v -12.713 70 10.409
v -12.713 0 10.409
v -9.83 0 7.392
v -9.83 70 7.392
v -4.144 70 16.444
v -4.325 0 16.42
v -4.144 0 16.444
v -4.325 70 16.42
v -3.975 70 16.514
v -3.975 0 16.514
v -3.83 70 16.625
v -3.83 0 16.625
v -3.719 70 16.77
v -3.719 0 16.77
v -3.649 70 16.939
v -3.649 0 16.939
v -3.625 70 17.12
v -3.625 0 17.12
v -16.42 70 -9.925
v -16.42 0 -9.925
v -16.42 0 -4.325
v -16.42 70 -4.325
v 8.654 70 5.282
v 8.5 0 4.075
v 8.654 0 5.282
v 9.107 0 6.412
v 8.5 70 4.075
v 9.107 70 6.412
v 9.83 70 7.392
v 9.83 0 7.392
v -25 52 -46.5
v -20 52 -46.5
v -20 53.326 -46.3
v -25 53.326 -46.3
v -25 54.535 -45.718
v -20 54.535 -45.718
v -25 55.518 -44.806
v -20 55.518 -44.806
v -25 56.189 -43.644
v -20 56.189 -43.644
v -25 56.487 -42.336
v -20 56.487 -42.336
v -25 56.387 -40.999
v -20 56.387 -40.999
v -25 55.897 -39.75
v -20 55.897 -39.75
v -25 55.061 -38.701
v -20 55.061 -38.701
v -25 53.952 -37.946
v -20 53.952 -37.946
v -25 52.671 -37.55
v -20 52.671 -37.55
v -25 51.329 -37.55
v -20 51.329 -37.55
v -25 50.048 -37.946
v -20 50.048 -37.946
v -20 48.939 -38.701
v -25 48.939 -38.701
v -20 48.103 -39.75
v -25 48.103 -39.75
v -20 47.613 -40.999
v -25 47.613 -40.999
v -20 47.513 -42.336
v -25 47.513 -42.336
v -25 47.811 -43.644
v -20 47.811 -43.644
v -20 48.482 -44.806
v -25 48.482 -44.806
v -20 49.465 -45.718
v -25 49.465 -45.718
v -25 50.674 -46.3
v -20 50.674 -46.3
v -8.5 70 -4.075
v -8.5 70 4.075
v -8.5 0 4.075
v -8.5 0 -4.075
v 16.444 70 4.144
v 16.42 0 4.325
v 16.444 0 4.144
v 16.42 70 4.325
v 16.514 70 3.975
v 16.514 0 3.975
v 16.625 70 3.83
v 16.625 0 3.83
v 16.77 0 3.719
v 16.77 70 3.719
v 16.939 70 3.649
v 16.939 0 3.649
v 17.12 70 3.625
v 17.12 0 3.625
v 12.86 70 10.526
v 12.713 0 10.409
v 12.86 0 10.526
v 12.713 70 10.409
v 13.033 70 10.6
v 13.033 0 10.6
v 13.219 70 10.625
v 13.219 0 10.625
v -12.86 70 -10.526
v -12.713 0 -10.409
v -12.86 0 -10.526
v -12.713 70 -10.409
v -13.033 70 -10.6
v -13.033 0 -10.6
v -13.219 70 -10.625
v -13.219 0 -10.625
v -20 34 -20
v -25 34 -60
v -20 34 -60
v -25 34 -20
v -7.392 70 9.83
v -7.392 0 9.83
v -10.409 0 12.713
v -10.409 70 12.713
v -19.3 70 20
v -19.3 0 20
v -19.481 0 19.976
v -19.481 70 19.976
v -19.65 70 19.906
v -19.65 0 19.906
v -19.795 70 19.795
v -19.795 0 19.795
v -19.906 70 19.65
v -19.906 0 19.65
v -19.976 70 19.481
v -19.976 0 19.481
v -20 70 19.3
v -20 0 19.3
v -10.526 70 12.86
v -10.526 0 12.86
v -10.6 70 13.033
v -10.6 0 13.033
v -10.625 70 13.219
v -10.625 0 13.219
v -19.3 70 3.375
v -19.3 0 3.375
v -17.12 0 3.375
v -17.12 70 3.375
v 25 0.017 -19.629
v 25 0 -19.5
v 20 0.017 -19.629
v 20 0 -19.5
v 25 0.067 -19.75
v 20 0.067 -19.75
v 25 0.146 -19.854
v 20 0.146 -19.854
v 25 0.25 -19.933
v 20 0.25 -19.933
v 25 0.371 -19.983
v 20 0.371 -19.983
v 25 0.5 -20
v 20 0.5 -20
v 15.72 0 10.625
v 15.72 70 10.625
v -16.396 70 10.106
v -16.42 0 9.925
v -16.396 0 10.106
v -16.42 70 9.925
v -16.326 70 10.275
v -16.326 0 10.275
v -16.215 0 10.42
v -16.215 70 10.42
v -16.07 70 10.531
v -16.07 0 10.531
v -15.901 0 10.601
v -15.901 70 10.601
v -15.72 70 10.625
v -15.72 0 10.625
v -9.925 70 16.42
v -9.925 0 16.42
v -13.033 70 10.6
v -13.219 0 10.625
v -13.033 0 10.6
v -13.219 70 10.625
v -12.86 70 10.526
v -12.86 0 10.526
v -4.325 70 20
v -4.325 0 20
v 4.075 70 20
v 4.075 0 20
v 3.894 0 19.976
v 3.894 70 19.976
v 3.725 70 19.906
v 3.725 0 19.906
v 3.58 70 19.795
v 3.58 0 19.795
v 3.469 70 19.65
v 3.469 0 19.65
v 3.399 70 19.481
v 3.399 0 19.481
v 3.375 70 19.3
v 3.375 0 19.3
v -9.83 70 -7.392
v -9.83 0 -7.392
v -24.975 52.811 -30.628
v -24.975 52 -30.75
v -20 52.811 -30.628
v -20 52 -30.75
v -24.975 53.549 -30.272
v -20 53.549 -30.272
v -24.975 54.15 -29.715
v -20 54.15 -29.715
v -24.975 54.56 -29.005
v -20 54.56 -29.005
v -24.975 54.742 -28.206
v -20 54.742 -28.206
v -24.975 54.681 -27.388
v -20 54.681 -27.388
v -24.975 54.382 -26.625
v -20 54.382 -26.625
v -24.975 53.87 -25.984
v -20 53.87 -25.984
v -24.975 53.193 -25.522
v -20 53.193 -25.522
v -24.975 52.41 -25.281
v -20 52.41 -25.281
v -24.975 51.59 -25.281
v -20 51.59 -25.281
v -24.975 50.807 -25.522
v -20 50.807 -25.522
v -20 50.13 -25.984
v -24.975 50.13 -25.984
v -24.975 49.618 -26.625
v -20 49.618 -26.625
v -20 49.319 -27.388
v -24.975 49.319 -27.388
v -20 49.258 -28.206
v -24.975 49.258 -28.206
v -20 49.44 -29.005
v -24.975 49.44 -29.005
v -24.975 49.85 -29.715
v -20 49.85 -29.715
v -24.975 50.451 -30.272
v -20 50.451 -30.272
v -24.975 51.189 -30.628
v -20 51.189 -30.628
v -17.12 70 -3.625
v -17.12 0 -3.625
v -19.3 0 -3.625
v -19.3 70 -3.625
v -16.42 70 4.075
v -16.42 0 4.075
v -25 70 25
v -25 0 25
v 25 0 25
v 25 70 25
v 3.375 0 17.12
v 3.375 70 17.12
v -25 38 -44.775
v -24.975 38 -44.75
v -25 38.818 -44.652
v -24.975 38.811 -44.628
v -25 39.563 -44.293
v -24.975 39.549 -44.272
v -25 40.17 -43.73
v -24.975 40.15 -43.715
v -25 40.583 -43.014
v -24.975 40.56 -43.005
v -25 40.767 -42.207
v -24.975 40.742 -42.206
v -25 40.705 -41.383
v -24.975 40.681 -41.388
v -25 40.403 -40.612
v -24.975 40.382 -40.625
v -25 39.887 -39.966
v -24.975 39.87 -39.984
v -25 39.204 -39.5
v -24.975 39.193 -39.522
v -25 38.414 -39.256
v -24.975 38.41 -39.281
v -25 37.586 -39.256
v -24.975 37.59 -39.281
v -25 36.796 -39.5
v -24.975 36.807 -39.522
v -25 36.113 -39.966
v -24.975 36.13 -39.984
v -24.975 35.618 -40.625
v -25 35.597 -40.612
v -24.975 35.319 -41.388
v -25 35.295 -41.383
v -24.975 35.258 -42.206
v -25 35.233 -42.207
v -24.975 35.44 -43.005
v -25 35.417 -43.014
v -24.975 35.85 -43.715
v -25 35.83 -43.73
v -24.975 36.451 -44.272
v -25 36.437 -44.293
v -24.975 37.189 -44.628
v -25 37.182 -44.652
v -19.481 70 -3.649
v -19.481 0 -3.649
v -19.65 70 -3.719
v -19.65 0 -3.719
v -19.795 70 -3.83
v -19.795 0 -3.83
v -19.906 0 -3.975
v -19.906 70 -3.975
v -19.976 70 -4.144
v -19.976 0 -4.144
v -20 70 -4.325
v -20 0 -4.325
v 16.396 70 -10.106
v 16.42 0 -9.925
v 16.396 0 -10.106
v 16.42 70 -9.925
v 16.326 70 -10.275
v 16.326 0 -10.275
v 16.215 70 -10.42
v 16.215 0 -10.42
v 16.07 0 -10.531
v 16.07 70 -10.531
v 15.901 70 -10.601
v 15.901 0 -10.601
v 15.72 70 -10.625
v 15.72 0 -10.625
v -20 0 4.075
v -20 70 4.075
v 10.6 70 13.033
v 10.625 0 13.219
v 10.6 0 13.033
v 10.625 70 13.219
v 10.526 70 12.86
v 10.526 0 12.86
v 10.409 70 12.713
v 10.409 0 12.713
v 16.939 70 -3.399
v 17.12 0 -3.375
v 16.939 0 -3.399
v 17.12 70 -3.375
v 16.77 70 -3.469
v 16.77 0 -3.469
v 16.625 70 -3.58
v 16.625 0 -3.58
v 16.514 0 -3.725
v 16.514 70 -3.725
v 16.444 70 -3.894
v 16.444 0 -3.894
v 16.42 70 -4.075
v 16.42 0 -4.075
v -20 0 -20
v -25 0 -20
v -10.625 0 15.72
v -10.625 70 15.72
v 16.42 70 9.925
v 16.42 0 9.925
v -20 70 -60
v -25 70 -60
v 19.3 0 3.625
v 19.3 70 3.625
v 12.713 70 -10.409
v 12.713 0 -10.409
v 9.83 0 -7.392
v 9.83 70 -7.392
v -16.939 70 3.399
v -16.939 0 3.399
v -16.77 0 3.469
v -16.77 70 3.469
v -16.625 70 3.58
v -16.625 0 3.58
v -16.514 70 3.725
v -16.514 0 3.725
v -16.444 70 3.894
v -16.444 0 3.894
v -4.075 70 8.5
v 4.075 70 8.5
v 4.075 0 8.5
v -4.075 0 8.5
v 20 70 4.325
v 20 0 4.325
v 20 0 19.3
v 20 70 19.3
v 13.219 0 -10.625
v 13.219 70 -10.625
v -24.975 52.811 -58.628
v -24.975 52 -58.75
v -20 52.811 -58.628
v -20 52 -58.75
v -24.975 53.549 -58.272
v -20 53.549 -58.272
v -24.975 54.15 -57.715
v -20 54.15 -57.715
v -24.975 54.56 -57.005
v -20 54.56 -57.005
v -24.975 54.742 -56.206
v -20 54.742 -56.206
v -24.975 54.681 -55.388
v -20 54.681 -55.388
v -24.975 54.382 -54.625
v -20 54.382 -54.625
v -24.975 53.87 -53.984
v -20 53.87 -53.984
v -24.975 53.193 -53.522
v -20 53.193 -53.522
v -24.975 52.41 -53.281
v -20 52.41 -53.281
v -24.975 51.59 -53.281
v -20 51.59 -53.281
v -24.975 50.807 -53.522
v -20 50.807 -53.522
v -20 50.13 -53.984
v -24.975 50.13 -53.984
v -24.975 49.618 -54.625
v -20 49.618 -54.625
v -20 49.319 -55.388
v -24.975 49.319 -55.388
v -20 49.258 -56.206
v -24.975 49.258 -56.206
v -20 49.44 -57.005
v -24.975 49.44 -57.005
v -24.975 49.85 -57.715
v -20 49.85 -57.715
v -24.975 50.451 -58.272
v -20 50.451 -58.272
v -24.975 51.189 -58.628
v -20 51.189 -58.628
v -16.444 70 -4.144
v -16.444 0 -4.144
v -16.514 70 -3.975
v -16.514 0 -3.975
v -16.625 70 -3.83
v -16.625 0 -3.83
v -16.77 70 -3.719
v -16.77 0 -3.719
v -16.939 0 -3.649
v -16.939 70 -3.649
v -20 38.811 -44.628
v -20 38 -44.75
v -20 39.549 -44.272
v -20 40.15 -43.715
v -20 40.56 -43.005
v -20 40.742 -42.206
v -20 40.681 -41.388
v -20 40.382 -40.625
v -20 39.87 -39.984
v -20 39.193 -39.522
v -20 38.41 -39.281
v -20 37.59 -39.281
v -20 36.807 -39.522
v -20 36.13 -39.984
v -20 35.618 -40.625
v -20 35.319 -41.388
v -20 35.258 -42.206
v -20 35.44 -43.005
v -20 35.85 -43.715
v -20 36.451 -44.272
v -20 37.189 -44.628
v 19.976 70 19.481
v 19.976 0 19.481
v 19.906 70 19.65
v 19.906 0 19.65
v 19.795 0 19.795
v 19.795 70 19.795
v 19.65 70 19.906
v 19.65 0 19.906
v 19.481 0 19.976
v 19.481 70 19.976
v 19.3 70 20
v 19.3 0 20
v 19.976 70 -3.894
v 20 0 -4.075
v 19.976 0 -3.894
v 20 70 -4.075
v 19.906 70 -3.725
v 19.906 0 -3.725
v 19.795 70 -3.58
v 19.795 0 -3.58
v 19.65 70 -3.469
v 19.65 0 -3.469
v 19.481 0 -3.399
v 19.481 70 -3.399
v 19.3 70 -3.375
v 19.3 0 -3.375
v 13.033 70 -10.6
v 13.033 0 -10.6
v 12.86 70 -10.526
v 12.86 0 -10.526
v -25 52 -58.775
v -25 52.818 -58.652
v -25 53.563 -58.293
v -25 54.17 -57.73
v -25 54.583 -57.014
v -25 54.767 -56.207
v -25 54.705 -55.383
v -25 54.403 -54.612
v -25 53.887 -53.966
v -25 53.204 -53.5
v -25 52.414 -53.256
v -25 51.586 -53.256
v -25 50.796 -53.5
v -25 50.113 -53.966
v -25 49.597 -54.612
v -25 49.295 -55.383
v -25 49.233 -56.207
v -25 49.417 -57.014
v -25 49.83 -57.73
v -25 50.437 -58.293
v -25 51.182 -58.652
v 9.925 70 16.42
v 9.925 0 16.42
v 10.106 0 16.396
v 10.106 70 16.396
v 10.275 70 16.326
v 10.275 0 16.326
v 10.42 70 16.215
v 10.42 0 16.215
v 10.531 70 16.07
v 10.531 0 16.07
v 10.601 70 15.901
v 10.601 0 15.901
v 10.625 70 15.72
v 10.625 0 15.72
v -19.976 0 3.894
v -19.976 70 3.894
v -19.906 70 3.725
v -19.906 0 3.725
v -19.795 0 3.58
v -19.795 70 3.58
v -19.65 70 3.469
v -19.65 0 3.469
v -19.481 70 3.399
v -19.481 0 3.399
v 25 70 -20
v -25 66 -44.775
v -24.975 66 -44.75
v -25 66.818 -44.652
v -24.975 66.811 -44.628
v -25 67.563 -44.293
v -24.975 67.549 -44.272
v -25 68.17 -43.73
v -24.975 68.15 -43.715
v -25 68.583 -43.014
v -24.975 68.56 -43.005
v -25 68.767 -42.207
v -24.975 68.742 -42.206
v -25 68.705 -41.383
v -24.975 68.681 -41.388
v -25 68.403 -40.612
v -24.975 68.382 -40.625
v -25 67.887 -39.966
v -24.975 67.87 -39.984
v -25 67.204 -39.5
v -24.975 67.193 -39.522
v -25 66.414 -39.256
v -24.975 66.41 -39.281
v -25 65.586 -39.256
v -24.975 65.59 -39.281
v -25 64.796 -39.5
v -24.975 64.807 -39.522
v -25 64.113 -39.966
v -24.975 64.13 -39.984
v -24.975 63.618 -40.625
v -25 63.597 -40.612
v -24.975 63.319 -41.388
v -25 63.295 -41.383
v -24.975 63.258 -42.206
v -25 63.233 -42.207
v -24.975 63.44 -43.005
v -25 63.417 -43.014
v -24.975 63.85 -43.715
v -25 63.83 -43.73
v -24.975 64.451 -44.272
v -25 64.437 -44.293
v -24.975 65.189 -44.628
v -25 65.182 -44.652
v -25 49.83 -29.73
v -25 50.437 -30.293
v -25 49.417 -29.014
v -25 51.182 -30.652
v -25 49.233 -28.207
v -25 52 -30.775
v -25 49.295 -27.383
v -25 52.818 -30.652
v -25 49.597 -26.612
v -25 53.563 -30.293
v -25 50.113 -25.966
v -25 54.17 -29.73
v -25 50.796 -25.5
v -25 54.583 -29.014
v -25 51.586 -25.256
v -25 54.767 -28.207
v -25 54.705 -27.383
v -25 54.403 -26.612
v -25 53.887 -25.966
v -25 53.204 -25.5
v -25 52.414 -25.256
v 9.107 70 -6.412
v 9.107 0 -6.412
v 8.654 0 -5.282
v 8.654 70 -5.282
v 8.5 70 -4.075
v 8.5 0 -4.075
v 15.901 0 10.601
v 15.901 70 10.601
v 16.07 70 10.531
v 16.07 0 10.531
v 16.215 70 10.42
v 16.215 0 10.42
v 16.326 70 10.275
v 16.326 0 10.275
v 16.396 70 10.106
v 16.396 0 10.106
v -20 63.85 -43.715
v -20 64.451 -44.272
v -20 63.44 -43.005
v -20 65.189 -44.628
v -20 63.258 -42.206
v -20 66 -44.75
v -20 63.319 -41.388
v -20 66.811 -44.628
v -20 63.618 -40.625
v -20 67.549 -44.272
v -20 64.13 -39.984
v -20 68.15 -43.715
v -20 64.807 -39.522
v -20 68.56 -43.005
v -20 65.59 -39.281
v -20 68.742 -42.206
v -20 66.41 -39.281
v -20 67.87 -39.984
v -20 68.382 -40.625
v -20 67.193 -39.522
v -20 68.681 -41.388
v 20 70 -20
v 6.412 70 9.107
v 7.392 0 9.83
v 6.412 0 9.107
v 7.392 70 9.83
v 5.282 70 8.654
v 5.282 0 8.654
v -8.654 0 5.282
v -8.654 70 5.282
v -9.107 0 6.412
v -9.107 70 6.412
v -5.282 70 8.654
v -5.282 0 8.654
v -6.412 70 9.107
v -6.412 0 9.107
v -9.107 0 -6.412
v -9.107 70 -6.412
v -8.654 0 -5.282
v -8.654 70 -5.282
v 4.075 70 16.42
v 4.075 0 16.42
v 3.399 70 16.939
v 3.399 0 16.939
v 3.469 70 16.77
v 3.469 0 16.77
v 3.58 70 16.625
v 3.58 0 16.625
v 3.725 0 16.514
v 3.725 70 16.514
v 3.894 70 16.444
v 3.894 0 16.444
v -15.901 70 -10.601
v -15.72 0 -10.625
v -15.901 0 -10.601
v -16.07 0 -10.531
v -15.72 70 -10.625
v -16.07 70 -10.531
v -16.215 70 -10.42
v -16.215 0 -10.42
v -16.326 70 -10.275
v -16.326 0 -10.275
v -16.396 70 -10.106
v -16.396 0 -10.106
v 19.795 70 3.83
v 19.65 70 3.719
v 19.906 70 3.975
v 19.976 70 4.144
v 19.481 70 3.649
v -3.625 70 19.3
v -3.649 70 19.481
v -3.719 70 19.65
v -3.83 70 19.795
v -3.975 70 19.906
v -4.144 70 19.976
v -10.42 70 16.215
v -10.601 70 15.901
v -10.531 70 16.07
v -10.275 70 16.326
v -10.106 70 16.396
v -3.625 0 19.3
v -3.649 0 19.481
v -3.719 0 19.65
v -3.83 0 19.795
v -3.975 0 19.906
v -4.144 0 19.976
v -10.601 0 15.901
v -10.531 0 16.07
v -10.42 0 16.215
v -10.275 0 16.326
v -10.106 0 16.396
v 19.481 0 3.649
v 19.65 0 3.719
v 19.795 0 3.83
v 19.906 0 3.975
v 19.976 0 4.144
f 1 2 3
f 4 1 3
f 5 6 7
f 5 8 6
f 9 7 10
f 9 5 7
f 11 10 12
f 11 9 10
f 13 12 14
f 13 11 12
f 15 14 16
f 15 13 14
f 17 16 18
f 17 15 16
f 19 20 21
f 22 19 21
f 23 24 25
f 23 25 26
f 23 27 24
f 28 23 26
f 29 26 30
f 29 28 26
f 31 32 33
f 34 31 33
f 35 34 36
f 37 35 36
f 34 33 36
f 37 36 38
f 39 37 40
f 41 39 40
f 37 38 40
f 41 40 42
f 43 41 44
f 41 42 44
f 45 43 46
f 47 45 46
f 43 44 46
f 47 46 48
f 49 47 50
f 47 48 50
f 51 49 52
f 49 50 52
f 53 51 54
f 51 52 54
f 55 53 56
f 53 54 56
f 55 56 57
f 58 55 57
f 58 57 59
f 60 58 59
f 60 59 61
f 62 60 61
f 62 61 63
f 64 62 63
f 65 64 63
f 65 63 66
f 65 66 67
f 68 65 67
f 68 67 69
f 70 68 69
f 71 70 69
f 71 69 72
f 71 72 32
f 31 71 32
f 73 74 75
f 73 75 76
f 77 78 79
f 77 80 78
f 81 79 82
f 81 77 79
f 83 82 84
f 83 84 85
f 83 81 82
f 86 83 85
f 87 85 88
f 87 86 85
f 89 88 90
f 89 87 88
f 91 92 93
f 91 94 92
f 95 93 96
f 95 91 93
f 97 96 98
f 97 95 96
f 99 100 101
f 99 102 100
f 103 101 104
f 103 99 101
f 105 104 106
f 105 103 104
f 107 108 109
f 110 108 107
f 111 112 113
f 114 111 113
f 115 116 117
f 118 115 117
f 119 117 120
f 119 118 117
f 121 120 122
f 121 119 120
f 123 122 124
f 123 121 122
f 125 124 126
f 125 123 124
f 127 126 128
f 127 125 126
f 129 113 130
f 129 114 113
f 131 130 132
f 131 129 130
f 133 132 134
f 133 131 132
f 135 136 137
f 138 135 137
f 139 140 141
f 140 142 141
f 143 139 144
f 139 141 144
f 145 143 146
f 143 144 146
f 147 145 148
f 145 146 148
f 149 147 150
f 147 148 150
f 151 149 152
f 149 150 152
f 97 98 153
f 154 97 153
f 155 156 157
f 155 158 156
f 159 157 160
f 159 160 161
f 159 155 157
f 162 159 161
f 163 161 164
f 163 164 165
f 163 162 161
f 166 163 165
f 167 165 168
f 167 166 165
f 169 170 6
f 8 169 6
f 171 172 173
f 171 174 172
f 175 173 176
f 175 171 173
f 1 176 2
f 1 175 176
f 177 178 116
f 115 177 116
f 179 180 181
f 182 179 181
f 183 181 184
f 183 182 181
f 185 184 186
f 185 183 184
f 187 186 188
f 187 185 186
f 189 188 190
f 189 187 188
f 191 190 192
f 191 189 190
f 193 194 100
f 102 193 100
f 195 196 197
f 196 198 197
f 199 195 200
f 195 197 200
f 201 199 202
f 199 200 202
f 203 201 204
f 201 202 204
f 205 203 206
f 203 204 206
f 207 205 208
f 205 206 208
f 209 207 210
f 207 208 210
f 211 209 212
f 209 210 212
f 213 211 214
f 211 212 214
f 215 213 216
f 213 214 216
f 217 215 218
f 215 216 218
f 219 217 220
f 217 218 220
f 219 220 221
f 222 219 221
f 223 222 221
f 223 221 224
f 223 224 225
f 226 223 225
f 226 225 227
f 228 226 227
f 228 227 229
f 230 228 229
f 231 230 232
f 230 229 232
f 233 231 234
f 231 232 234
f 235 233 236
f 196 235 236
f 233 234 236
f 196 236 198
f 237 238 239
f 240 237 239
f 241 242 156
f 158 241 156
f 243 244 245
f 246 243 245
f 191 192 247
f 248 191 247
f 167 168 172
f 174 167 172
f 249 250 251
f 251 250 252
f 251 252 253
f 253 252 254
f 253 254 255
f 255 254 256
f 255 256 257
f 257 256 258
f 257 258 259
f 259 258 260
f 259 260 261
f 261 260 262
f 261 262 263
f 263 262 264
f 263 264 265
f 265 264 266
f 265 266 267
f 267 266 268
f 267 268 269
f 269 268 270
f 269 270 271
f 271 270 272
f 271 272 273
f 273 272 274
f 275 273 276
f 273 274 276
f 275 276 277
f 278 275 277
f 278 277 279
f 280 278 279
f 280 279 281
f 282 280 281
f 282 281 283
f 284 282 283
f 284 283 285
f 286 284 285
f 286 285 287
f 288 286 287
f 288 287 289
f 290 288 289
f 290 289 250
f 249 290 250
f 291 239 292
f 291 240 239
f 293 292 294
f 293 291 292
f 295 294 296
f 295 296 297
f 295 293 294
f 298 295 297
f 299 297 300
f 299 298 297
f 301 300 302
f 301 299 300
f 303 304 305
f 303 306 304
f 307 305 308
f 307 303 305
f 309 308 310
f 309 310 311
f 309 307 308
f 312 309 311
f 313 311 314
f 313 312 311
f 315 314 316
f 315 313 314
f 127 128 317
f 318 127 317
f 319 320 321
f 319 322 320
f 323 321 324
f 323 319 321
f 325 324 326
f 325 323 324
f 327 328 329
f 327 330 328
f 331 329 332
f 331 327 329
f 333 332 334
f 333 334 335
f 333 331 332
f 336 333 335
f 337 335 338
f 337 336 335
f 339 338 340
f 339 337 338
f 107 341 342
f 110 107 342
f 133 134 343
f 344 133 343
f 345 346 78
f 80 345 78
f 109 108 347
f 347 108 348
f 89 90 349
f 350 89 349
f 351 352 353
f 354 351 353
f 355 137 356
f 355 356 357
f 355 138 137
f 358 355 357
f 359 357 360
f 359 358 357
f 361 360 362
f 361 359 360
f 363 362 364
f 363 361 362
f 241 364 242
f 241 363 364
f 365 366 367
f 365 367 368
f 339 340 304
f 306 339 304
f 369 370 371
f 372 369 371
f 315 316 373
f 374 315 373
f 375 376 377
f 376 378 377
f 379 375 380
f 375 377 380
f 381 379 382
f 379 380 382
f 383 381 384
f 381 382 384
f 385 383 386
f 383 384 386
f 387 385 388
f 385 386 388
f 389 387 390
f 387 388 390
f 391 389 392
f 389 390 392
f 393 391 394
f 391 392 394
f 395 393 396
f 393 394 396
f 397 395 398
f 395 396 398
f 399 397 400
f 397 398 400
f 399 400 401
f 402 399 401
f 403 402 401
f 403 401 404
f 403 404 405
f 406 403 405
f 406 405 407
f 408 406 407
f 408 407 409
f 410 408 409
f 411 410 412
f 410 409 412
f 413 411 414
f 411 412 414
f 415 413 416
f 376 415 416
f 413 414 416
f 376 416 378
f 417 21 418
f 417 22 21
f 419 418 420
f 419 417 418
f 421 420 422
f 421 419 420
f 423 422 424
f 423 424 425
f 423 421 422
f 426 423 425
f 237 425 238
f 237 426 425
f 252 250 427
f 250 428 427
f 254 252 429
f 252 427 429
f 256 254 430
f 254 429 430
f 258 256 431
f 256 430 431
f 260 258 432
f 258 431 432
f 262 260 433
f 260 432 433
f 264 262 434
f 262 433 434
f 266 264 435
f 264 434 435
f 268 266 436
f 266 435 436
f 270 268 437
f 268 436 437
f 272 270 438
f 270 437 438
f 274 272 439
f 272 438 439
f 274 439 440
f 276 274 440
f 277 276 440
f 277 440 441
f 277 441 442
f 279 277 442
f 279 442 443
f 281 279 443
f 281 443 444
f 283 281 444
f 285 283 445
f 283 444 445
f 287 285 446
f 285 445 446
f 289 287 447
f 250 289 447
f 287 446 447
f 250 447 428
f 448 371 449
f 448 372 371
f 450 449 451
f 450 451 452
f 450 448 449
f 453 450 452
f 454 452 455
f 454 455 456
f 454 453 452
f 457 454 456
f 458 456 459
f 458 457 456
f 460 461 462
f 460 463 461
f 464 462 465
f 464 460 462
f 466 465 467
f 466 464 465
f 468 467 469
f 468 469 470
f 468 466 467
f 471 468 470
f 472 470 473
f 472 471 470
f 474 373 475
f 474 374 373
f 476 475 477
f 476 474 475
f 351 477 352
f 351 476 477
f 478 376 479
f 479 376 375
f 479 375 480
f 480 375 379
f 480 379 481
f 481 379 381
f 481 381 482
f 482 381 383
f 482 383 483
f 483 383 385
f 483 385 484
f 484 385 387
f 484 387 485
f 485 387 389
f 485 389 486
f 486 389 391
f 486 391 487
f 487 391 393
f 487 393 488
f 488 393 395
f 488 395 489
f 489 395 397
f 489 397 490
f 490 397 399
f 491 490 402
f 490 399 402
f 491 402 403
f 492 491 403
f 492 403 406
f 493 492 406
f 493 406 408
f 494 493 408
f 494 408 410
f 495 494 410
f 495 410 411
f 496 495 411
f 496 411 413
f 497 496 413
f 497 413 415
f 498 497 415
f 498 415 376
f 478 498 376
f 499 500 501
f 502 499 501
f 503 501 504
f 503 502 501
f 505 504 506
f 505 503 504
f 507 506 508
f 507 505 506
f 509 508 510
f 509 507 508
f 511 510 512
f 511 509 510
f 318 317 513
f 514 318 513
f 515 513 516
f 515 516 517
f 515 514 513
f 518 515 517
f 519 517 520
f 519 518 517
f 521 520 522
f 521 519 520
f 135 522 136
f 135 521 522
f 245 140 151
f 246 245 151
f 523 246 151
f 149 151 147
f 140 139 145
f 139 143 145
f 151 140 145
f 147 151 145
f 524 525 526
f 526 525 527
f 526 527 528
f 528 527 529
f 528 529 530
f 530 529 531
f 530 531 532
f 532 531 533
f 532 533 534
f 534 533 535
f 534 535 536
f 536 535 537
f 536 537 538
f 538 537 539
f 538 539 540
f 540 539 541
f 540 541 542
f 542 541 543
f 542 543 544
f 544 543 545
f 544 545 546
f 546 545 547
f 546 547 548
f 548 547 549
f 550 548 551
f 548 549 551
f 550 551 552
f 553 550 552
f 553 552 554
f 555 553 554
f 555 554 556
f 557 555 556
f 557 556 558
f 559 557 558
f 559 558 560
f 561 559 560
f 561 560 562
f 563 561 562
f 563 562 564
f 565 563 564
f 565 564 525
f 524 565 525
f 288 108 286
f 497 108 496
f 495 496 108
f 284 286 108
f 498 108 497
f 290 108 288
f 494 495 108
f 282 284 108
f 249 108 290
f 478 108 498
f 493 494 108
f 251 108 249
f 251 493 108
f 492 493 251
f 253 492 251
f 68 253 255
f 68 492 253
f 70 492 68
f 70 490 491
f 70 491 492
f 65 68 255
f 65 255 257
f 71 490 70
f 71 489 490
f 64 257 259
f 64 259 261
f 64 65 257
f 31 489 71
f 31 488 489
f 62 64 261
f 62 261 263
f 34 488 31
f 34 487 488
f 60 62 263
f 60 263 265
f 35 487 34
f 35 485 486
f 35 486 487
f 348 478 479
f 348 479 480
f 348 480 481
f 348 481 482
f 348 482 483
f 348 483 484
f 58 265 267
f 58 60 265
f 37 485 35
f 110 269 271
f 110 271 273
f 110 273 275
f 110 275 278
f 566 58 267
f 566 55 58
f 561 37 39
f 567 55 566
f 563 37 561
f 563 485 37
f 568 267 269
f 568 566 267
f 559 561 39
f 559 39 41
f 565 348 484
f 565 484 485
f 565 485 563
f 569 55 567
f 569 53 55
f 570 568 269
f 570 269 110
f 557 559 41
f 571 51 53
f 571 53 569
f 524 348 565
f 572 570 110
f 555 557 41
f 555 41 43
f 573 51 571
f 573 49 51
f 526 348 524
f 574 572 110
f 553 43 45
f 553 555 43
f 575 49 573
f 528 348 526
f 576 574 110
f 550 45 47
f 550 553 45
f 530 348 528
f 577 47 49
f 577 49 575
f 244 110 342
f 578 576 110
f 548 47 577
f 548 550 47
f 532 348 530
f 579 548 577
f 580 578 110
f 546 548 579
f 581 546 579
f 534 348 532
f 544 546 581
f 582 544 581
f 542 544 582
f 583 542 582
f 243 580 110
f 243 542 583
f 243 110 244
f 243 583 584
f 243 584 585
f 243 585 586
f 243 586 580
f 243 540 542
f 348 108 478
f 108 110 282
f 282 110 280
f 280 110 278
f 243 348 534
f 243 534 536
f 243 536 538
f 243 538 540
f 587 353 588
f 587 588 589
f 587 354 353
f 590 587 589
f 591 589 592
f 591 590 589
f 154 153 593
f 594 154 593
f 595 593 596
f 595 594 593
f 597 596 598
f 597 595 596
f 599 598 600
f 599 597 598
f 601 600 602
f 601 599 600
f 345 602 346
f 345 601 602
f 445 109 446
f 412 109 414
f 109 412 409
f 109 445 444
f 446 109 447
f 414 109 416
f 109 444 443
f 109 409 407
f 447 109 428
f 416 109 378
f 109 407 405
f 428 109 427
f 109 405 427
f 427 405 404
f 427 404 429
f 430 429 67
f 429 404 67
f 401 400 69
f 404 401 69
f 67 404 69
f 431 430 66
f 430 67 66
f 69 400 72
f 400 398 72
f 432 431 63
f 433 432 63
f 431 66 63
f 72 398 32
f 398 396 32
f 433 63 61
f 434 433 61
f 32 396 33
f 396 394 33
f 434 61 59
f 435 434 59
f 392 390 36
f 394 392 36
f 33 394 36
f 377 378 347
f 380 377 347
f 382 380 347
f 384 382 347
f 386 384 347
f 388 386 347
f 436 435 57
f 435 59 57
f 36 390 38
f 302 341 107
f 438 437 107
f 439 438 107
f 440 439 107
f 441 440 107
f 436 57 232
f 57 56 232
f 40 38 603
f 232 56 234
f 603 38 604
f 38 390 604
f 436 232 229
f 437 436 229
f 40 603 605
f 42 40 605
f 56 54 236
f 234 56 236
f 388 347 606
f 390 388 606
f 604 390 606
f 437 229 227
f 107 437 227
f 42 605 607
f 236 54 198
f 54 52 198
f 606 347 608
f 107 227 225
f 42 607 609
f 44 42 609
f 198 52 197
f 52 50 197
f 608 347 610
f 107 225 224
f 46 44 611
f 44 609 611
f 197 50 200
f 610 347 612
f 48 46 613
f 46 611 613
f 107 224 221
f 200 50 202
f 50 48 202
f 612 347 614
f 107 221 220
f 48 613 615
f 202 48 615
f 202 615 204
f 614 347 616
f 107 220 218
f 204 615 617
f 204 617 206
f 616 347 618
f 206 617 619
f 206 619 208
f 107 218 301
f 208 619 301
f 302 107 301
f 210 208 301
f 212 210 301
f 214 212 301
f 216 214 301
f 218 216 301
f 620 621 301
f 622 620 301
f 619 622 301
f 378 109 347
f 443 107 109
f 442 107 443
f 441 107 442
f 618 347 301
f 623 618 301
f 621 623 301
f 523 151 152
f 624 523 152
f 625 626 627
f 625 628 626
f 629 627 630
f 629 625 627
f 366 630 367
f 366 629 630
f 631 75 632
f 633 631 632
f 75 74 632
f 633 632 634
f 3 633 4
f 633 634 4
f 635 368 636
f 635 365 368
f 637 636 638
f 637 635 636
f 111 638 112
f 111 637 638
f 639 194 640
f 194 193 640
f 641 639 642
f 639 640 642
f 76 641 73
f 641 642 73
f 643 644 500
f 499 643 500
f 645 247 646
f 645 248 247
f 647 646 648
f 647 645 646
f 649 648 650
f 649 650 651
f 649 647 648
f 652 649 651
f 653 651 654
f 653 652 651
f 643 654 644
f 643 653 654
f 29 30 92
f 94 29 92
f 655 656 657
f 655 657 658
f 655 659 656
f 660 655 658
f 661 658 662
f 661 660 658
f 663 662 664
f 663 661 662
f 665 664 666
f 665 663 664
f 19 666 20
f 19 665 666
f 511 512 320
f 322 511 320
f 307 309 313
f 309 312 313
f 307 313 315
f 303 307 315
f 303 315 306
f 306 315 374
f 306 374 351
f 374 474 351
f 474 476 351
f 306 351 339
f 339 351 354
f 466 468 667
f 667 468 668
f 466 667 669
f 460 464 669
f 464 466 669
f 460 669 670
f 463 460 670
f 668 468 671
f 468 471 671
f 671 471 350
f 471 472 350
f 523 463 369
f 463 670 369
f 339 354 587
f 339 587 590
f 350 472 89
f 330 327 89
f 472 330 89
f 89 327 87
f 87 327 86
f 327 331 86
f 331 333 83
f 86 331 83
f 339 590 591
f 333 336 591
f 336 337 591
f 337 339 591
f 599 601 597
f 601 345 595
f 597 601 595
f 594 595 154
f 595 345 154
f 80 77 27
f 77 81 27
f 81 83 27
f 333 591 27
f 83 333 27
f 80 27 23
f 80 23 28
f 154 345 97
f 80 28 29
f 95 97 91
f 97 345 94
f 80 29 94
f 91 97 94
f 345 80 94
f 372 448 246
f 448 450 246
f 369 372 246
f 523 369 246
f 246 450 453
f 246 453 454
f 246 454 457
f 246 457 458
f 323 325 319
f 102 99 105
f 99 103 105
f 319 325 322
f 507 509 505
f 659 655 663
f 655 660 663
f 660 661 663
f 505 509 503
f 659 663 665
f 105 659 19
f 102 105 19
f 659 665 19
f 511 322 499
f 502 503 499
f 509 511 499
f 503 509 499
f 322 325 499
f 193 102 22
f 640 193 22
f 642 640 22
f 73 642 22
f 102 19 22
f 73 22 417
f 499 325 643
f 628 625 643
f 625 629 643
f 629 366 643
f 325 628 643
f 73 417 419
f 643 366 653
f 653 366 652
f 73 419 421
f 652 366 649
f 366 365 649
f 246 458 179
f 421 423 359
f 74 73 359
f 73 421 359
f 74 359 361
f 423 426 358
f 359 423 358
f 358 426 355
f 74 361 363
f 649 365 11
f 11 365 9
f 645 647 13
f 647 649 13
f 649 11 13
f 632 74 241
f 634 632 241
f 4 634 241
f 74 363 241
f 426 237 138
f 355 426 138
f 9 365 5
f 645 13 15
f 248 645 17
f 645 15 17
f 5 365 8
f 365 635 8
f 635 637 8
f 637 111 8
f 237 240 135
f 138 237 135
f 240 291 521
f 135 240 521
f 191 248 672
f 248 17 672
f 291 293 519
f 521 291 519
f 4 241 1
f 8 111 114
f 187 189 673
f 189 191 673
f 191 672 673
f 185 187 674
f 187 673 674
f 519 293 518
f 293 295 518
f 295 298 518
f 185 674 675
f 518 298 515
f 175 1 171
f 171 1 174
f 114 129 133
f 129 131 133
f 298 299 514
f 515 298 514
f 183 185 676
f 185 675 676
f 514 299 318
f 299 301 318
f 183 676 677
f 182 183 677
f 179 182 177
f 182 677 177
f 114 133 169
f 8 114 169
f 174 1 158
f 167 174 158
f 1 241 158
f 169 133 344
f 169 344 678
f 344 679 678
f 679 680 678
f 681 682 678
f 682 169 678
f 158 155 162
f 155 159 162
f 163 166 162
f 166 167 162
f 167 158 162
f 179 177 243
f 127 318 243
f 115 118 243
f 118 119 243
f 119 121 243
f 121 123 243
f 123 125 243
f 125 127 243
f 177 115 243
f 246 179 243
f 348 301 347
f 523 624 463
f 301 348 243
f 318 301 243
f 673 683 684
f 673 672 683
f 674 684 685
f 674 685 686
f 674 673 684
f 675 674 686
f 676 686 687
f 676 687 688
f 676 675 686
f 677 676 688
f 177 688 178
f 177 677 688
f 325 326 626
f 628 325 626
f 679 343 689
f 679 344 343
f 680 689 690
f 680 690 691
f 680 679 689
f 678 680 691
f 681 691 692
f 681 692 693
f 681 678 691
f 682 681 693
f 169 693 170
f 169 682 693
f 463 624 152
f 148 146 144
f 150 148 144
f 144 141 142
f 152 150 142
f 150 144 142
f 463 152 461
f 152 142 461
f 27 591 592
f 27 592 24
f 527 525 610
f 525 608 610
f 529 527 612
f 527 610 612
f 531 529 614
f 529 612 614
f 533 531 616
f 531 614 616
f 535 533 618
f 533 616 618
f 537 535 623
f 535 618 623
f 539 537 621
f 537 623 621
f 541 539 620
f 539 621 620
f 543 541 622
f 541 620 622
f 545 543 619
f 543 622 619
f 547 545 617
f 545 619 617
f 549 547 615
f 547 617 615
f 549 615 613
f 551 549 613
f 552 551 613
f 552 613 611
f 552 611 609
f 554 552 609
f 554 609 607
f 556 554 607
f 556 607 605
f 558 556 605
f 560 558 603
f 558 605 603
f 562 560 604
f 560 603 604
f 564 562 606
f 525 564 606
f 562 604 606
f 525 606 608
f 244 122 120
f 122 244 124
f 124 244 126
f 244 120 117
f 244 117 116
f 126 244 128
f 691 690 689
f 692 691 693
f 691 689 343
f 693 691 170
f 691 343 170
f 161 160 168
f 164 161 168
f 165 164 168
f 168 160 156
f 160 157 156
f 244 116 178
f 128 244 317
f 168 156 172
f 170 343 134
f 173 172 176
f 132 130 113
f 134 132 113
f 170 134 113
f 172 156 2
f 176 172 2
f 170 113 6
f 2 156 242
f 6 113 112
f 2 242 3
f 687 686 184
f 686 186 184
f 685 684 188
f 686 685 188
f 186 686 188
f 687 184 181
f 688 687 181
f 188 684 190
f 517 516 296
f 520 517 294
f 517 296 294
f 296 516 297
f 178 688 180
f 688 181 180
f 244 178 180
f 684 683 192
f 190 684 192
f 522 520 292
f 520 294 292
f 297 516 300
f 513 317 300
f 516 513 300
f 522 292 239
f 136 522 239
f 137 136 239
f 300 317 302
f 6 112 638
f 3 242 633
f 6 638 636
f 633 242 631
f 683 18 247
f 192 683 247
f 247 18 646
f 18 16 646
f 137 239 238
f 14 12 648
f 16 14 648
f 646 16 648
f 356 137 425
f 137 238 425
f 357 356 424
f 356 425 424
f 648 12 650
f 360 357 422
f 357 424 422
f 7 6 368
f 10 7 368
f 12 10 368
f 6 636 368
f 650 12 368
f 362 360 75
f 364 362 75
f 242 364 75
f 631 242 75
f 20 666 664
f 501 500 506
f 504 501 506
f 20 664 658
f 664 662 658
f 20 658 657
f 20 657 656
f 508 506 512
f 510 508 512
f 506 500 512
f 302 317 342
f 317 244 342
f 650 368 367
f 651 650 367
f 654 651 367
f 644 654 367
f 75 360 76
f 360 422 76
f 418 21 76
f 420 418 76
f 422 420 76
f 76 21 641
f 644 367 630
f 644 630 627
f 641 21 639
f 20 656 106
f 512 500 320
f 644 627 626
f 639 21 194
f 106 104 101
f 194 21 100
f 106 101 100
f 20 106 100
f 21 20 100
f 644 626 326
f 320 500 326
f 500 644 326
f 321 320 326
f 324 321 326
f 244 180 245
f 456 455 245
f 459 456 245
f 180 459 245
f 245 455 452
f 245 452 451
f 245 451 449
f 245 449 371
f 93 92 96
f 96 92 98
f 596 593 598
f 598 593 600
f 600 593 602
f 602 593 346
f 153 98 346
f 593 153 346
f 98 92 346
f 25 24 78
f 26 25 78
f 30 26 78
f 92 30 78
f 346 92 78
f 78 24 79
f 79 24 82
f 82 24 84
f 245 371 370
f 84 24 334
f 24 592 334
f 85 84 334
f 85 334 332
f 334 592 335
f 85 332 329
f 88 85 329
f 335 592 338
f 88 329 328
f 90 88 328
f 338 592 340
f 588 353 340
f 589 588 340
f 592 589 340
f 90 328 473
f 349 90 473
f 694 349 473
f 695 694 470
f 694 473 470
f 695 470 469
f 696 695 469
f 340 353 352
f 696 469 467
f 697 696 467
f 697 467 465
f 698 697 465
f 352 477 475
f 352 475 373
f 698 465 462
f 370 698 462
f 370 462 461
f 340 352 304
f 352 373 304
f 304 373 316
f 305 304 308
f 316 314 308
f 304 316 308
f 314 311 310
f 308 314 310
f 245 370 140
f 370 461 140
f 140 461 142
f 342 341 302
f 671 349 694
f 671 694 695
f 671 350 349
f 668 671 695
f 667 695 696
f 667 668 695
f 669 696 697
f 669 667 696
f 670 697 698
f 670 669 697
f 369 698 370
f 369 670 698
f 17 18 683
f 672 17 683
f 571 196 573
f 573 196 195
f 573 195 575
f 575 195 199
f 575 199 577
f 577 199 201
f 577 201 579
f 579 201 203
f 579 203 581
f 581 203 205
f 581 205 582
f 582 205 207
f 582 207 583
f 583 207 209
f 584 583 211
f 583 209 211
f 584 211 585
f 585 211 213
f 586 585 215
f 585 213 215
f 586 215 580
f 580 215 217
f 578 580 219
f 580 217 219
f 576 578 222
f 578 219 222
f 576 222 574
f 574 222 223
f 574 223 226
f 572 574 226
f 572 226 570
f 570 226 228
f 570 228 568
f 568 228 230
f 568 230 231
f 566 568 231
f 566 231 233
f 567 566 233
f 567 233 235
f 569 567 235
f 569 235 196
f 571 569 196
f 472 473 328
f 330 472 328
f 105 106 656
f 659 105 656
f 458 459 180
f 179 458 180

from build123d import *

# Parameters (mm, degrees)
BOSS_EXTRUDE1_DEPTH            = 70
FILLET4_R                      = 0.7
FILLET6_R                      = 4.8
FILLET12_R                     = 0.5
SKETCH2_W                      = 40
SKETCH2_H                      = 36
BOSS_EXTRUDE2_DEPTH            = 5
M5_CLEARANCE_HOLE1_D           = 5.5
M5_CLEARANCE_HOLE1_DEPTH       = 13
M5_CLEARANCE_HOLE1_CSINK_D     = 5.55
M5_CLEARANCE_HOLE1_CSINK_ANGLE = 90
M5_CLEARANCE_HOLE1_TIP         = 1.652366702
SKETCH7_R                      = 4.5
CUT_EXTRUDE1_DEPTH             = 46
CUT_EXTRUDE1_DEPTH_BACK        = 6


with BuildPart() as part:
    # Sketch1 → Boss-Extrude1 (new body)
    with BuildSketch(Plane(origin=(0, 0, 0), x_dir=(1, 0, 0), z_dir=(0, 1, 0))):
        Polygon((-25, -25), (25, -25), (25, 20), (20, 20), (20, 3.375), (16.42, 3.375), (16.42, 10.625), (12.92, 10.625), (8.5, 6), (8.5, -6), (12.92, -10.625), (16.42, -10.625), (16.42, -3.625), (20, -3.625), (20, -20), (3.375, -20), (3.375, -16.42), (10.625, -16.42), (10.625, -12.92), (6, -8.5), (-6, -8.5), (-10.625, -12.92), (-10.625, -16.42), (-3.625, -16.42), (-3.625, -20), (-20, -20), (-20, -3.375), (-16.42, -3.375), (-16.42, -10.625), (-12.92, -10.625), (-8.5, -6), (-8.5, 6), (-12.92, 10.625), (-16.42, 10.625), (-16.42, 3.625), (-20, 3.625), (-20, 20), (-25, 20), align=None)
    extrude(amount=BOSS_EXTRUDE1_DEPTH)

    # Fillet4
    fillet4_edges = [part.edges().sort_by_distance(p)[0] for p in [
        (-3.625, 35, 16.42),
        (-10.625, 35, 16.42),
        (-10.625, 35, 12.92),
        (10.625, 35, 12.92),
        (10.625, 35, 16.42),
        (3.375, 35, 16.42),
        (3.375, 35, 20),
        (20, 35, 20),
        (20, 35, 3.625),
        (16.42, 35, 3.625),
        (16.42, 35, 10.625),
        (12.92, 35, 10.625),
        (12.92, 35, -10.625),
        (16.42, 35, -10.625),
        (16.42, 35, -3.375),
        (20, 35, -3.375),
        (-20, 35, -3.625),
        (-16.42, 35, -3.625),
        (-16.42, 35, -10.625),
        (-12.92, 35, -10.625),
        (-12.92, 35, 10.625),
        (-16.42, 35, 10.625),
        (-16.42, 35, 3.375),
        (-20, 35, 3.375),
        (-20, 35, 20),
        (-3.625, 35, 20),
    ]]
    fillet(fillet4_edges, radius=FILLET4_R)

    # Fillet6
    fillet6_edges = [part.edges().sort_by_distance(p)[0] for p in [
        (-6, 35, 8.5),
        (6, 35, 8.5),
        (8.5, 35, 6),
        (8.5, 35, -6),
        (-8.5, 35, -6),
        (-8.5, 35, 6),
    ]]
    fillet(fillet6_edges, radius=FILLET6_R)

    # Fillet12
    fillet12_edges = [part.edges().sort_by_distance(p)[0] for p in [
        (22.5, 0, -20),
    ]]
    fillet(fillet12_edges, radius=FILLET12_R)

    # Sketch2 → Boss-Extrude2 (add)
    with BuildSketch(Plane.ZY.offset(25)):
        with Locations((-40, 52)):
            Rectangle(SKETCH2_W, SKETCH2_H)
    extrude(amount=-BOSS_EXTRUDE2_DEPTH)

    # M5 Clearance Hole1
    with Locations(Plane.ZY.offset(25)):
        with Locations((-56, 52), (-42, 66), (-28, 52), (-42, 38)):
            CounterSinkHole(M5_CLEARANCE_HOLE1_D / 2, M5_CLEARANCE_HOLE1_CSINK_D / 2, depth=M5_CLEARANCE_HOLE1_DEPTH, counter_sink_angle=M5_CLEARANCE_HOLE1_CSINK_ANGLE)
            with Locations((0, 0, -(M5_CLEARANCE_HOLE1_DEPTH + M5_CLEARANCE_HOLE1_TIP / 2))):  # 118° drill point
                Cone(0, M5_CLEARANCE_HOLE1_D / 2, M5_CLEARANCE_HOLE1_TIP, mode=Mode.SUBTRACT)

    # Sketch7 → Cut-Extrude1 (cut, two sides)
    with BuildSketch(Plane(origin=(-20, 0, 0), x_dir=(0, 0, -1), z_dir=(1, 0, 0))) as cut_extrude1_sk:
        with Locations((42, 52)):
            Circle(SKETCH7_R)
    extrude(amount=CUT_EXTRUDE1_DEPTH, mode=Mode.SUBTRACT)
    extrude(cut_extrude1_sk.sketch, amount=-CUT_EXTRUDE1_DEPTH_BACK, mode=Mode.SUBTRACT)


solid = part.part
